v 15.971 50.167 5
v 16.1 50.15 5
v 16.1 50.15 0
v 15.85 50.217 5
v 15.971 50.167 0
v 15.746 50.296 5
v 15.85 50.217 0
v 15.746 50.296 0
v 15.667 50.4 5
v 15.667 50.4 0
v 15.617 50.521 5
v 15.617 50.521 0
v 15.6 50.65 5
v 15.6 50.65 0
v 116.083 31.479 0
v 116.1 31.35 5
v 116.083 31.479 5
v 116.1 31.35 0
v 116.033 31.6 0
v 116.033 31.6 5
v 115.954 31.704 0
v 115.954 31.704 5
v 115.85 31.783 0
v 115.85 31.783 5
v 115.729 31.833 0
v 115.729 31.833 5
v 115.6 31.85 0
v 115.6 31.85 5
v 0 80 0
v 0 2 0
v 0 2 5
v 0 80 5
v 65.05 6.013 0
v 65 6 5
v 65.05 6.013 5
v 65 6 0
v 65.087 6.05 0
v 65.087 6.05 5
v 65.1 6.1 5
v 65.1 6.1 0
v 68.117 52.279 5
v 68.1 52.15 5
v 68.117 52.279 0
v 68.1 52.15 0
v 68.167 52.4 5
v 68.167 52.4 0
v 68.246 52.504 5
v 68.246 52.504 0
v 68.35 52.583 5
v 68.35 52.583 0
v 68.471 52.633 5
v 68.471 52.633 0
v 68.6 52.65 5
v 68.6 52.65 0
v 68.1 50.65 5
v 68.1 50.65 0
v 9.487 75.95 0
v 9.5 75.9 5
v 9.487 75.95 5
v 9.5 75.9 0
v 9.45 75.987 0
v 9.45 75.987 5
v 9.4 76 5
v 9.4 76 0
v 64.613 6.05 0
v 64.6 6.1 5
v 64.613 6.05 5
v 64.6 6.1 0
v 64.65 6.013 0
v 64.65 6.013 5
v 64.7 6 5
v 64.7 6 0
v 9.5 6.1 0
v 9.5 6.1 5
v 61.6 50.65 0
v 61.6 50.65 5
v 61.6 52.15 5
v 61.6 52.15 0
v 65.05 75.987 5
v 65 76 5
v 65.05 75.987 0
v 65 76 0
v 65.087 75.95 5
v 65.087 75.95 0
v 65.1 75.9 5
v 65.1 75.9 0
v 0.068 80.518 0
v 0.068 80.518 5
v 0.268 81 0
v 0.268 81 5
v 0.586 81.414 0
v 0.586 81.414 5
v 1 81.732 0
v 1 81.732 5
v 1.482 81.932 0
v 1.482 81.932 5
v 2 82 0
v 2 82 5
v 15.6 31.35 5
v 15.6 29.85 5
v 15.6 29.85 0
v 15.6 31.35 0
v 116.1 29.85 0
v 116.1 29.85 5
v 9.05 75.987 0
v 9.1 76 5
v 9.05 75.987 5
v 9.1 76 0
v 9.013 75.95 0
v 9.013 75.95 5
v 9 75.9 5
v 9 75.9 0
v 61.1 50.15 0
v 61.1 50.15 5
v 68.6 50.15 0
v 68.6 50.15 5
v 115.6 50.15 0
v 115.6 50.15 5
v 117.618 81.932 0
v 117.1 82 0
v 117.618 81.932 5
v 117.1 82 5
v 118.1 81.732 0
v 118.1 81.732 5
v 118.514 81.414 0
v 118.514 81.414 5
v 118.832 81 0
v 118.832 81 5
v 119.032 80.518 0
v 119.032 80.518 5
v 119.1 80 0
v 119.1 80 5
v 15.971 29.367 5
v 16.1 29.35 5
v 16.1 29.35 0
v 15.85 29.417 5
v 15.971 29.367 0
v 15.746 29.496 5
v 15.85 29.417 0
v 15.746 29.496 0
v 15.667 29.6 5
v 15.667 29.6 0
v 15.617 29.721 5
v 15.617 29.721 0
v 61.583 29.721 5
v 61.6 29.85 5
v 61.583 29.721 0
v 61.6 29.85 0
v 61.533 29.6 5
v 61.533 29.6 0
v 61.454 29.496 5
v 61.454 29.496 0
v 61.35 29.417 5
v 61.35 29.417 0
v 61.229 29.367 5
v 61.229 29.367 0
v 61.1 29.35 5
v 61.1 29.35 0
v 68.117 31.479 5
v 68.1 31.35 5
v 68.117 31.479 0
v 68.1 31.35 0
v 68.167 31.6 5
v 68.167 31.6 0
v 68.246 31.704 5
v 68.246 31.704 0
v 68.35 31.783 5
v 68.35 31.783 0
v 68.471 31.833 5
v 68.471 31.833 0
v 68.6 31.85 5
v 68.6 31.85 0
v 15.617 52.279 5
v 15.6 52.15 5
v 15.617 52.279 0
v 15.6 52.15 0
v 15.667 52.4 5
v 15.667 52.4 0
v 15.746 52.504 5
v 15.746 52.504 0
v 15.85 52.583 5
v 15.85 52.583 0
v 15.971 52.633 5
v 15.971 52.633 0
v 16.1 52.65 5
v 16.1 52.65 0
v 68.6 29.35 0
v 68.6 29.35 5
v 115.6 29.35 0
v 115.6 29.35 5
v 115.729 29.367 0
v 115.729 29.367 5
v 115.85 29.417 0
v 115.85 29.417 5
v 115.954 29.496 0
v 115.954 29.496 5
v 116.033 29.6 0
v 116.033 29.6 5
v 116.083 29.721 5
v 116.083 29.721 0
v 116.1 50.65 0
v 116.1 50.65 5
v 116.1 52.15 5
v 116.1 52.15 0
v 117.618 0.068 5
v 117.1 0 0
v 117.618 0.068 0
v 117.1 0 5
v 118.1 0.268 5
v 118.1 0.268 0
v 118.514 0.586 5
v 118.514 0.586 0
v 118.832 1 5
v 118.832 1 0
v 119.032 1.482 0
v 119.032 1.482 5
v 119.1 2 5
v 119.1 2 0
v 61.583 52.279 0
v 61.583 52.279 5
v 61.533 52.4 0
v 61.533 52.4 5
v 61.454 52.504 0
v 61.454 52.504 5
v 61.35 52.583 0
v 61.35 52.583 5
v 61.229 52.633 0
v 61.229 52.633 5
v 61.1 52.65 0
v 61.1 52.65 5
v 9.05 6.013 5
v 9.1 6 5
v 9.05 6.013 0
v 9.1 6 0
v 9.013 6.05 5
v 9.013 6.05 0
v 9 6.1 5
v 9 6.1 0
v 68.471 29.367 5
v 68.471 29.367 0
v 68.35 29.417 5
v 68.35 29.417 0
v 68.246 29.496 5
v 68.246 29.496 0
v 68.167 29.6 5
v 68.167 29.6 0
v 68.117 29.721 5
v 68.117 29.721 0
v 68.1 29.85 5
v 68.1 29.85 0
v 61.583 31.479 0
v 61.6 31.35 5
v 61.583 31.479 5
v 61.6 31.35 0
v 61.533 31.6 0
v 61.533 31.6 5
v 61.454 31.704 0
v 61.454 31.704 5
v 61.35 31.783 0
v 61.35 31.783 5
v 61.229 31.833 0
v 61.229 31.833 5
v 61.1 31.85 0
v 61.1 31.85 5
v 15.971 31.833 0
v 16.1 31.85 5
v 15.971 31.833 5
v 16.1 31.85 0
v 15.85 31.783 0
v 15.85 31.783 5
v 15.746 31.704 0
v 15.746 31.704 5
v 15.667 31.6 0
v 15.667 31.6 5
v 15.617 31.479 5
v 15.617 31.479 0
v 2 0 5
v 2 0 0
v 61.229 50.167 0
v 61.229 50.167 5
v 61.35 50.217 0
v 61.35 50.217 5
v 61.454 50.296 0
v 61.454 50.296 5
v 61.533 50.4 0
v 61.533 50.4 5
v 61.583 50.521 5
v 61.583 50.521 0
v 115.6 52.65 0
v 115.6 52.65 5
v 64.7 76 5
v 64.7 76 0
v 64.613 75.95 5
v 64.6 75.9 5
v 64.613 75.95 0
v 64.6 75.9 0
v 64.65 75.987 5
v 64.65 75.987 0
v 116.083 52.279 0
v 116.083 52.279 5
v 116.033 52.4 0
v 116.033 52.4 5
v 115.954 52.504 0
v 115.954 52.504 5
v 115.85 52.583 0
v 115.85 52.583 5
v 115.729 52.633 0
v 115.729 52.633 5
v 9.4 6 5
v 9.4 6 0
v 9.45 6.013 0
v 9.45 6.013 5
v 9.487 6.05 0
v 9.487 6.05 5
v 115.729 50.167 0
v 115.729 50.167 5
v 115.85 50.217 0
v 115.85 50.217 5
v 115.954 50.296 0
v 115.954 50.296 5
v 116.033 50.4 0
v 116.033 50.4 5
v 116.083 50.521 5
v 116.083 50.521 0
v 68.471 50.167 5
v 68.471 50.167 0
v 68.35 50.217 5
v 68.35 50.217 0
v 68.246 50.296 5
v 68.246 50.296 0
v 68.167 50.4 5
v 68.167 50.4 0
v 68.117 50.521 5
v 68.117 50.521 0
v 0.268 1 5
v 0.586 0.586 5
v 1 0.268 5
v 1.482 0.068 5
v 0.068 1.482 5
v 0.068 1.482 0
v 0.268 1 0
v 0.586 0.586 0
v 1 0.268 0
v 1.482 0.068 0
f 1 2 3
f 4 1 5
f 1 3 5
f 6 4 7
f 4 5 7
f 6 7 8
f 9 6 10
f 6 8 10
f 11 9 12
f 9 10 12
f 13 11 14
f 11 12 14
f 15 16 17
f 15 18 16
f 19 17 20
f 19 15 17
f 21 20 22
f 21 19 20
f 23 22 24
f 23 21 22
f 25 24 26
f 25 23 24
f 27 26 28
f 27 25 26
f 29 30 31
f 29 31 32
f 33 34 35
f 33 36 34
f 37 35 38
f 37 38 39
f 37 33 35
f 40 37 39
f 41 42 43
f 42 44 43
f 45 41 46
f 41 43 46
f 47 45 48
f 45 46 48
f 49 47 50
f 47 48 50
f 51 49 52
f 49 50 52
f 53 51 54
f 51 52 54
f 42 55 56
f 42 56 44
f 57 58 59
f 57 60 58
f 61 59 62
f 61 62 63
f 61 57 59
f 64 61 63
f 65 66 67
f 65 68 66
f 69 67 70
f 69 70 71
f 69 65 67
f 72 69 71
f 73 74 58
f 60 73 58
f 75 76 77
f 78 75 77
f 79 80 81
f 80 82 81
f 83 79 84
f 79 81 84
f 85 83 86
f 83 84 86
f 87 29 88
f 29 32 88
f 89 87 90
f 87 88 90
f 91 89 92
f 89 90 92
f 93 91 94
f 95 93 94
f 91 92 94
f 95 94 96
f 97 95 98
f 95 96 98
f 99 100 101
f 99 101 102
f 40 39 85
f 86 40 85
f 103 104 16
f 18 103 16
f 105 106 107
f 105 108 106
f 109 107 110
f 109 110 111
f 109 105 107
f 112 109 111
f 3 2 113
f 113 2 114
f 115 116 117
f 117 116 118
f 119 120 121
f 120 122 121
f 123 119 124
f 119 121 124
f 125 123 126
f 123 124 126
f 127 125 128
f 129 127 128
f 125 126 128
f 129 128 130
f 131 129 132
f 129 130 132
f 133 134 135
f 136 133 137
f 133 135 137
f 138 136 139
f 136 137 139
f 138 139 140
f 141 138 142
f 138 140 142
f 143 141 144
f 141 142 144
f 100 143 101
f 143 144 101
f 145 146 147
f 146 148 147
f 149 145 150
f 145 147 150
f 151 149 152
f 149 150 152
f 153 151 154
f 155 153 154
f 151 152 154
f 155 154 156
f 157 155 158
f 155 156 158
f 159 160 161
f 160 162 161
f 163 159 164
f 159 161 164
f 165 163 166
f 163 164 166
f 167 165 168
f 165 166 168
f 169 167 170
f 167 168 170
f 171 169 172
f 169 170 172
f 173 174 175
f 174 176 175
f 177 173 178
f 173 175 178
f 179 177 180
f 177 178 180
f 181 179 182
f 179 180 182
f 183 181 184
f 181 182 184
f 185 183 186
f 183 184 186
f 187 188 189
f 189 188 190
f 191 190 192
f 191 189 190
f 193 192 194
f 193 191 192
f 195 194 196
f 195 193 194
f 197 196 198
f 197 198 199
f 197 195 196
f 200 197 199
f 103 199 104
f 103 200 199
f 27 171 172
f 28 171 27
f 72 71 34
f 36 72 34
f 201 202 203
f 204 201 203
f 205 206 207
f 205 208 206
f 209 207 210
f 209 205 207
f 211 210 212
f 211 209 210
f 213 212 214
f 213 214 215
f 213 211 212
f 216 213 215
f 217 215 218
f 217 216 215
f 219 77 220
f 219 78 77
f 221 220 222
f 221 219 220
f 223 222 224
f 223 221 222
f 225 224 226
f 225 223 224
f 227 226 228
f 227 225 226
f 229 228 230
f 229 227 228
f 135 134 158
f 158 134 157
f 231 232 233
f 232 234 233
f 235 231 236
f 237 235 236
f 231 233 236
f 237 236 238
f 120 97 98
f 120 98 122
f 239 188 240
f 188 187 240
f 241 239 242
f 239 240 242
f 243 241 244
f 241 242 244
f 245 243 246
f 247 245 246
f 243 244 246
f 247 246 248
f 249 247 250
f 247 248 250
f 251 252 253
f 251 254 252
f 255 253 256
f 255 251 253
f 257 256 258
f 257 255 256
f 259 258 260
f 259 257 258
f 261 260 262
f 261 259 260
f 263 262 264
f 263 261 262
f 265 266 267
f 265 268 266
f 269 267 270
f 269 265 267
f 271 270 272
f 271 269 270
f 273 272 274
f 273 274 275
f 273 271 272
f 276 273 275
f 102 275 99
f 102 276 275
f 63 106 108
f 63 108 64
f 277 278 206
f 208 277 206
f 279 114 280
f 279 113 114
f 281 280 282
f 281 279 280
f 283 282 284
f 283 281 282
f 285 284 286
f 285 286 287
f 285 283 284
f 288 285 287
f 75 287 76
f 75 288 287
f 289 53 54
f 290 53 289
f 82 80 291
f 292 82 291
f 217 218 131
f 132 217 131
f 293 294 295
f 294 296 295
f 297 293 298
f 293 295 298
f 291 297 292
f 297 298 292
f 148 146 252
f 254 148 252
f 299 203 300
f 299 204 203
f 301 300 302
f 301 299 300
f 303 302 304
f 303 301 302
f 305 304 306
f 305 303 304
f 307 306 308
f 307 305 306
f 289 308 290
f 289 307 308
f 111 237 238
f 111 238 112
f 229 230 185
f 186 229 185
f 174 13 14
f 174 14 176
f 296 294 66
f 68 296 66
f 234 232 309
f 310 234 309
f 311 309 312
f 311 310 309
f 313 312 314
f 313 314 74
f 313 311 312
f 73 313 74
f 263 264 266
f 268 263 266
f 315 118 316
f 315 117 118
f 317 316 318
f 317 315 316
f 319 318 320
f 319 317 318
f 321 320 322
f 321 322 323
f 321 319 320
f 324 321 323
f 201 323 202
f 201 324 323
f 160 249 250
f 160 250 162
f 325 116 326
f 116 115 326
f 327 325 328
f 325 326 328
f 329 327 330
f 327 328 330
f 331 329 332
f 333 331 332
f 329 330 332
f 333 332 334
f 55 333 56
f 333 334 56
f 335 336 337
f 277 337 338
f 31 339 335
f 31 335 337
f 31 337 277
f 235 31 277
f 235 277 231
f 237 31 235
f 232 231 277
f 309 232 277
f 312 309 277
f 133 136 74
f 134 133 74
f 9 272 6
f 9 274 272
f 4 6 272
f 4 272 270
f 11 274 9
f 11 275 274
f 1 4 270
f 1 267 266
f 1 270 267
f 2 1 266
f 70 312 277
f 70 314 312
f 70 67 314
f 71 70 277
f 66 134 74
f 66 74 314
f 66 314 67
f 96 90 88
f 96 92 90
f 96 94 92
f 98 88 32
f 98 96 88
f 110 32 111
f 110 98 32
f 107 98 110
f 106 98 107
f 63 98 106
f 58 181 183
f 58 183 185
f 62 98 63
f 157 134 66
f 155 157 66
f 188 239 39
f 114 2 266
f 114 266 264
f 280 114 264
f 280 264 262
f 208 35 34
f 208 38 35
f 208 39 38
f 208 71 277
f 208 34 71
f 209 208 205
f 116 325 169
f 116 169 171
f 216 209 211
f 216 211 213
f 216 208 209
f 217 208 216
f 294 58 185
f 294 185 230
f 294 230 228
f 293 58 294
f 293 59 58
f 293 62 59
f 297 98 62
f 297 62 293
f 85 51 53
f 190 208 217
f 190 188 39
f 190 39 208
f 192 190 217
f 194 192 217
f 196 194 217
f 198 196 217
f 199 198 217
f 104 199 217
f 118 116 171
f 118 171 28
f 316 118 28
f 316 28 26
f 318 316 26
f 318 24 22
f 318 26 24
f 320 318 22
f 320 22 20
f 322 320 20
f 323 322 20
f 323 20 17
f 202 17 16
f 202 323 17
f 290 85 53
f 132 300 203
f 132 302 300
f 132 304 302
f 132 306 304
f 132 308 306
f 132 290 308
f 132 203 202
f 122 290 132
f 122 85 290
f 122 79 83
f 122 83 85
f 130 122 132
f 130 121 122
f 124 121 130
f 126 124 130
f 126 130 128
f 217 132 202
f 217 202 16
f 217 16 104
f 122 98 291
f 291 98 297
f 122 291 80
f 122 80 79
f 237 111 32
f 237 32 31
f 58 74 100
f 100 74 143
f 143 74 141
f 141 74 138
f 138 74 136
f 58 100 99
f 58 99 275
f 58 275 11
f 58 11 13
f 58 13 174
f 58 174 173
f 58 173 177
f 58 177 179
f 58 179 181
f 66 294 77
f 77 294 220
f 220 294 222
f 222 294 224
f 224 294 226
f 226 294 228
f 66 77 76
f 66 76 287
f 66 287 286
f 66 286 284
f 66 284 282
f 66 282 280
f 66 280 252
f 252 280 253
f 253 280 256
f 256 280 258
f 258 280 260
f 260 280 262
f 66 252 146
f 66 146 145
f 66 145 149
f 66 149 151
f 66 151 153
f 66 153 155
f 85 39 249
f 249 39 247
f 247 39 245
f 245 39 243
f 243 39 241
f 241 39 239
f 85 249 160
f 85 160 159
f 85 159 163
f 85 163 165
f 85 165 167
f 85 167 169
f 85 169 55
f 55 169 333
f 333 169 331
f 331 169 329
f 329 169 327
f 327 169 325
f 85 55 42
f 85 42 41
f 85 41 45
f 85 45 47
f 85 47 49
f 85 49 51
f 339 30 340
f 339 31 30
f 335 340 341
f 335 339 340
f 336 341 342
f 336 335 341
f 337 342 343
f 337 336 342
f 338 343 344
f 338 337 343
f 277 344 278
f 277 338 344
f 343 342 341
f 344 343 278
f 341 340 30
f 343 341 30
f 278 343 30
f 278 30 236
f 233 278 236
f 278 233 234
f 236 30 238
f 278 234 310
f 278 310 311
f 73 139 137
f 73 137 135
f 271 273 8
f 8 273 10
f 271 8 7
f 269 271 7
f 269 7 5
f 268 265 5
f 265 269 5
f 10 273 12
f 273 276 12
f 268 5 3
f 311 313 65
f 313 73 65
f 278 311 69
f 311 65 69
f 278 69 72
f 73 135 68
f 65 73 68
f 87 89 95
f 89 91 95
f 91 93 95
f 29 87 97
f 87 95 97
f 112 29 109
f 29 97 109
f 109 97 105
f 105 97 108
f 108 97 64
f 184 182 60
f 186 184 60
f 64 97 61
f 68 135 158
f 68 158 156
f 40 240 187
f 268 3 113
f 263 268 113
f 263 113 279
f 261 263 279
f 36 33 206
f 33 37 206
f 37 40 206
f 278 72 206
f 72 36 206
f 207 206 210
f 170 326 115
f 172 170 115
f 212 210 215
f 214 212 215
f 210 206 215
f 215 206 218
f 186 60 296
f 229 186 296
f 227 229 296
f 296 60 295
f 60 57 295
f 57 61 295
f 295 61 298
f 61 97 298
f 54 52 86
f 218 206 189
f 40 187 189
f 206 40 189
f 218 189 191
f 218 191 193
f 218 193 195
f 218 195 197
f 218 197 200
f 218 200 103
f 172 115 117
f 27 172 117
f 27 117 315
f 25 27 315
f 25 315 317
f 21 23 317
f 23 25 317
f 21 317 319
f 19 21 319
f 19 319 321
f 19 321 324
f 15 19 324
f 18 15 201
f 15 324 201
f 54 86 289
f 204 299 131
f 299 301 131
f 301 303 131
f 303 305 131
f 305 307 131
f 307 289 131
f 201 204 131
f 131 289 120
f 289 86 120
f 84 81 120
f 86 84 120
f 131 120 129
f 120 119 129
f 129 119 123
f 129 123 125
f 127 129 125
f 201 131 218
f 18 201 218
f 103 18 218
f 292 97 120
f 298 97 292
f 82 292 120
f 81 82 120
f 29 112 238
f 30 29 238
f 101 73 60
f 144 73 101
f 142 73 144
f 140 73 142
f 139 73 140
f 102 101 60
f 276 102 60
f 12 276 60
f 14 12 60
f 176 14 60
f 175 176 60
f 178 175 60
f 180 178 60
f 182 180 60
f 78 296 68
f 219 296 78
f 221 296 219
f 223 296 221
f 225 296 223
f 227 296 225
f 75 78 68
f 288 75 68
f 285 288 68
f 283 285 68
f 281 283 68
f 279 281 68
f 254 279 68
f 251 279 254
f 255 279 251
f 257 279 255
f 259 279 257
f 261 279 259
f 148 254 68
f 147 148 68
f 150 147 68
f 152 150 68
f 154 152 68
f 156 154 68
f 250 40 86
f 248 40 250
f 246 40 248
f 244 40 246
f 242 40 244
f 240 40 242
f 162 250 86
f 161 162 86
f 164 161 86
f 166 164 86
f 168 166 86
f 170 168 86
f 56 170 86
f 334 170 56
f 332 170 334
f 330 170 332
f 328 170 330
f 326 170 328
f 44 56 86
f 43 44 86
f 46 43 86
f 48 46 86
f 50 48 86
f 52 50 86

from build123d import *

# Parameters (mm, degrees)
F0_W     = 119.1
F0_H     = 82
F1_DEPTH = 5
F3_DEPTH = 63.1
F4_W     = 6.8
F4_H     = 2.5
F4_W_2   = 7
F4_W_3   = 6.5
F5_DEPTH = 53.3
F6_W     = 48
F6_H     = 2.5
F7_DEPTH = 27.8
F8_W     = 0.5
F8_H     = 70
F9_DEPTH = 25
F10_R    = 2
F11_R    = 0.5
F12_R    = 0.1


with BuildPart() as f1:
    # F0 (on Top) → F1 (new body)
    with BuildSketch(Plane.XY):
        with Locations((59.55, 41)):
            Rectangle(F0_W, F0_H)
    extrude(amount=F1_DEPTH)

    # F2 (on face) → F3 (cut)
    with BuildSketch(Plane.XY.offset(5)):
        Polygon((64.6, 76), (64.6, 25), (64.6, 6), (65.1, 6), (65.1, 76), align=None)
    extrude(amount=-F3_DEPTH, mode=Mode.SUBTRACT)

    # F4 (on face) → F5 (cut)
    with BuildSketch(Plane.XY.offset(5)):
        with Locations((32.3, 51.4)):
            Rectangle(F4_W, F4_H)
        Polygon((35.7, 50.15), (38.9217214942, 50.15), (41.1, 50.15), (41.1, 52.65), (35.7, 52.65), align=None)
        with Locations((44.6, 51.4)):
            Rectangle(F4_W_2, F4_H)
        with Locations((51.35, 51.4)):
            Rectangle(F4_W_3, F4_H)
        with Locations((19, 51.4)):
            Rectangle(F4_W, F4_H)
        with Locations((25.65, 51.4)):
            Rectangle(F4_W_3, F4_H)
        with Locations((58.1, 51.4)):
            Rectangle(F4_W_2, F4_H)
        with Locations((44.6, 30.6)):
            Rectangle(F4_W_2, F4_H)
        with Locations((32.3, 30.6)):
            Rectangle(F4_W, F4_H)
        with Locations((58.1, 30.6)):
            Rectangle(F4_W_2, F4_H)
        Polygon((41.1, 31.85), (38.9217214942, 31.85), (35.7, 31.85), (35.7, 29.35), (38, 29.35), (41.1, 29.35), align=None)
        with Locations((51.35, 30.6)):
            Rectangle(F4_W_3, F4_H)
        with Locations((25.65, 30.6)):
            Rectangle(F4_W_3, F4_H)
        with Locations((19, 30.6)):
            Rectangle(F4_W, F4_H)
    extrude(amount=-F5_DEPTH, mode=Mode.SUBTRACT)

    # F6 (on face) → F7 (cut)
    with BuildSketch(Plane.XY.offset(5)):
        with Locations((92.1, 51.4)):
            Rectangle(F6_W, F6_H)
        with Locations((92.1, 30.6)):
            Rectangle(F6_W, F6_H)
    extrude(amount=-F7_DEPTH, mode=Mode.SUBTRACT)

    # F8 (on face) → F9 (cut)
    with BuildSketch(Plane.XY.offset(5)):
        with Locations((9.25, 41)):
            Rectangle(F8_W, F8_H)
    extrude(amount=-F9_DEPTH, mode=Mode.SUBTRACT)

    # F10
    f10_edges = [f1.edges().sort_by_distance(p)[0] for p in [
        (119.1, 0, 2.5),
        (0, 0, 2.5),
        (119.1, 82, 2.5),
        (0, 82, 2.5),
    ]]
    fillet(f10_edges, radius=F10_R)

    # F11
    f11_edges = [f1.edges().sort_by_distance(p)[0] for p in [
        (15.6, 52.65, 2.5),
        (15.6, 50.15, 2.5),
        (61.6, 52.65, 2.5),
        (61.6, 50.15, 2.5),
        (68.1, 52.65, 2.5),
        (68.1, 50.15, 2.5),
        (116.1, 52.65, 2.5),
        (116.1, 50.15, 2.5),
        (116.1, 29.35, 2.5),
        (116.1, 31.85, 2.5),
        (68.1, 31.85, 2.5),
        (68.1, 29.35, 2.5),
        (15.6, 29.35, 2.5),
        (15.6, 31.85, 2.5),
        (61.6, 29.35, 2.5),
        (61.6, 31.85, 2.5),
    ]]
    fillet(f11_edges, radius=F11_R)

    # F12
    f12_edges = [f1.edges().sort_by_distance(p)[0] for p in [
        (64.6, 6, 2.5),
        (65.1, 6, 2.5),
        (64.6, 76, 2.5),
        (65.1, 76, 2.5),
        (9.5, 76, 2.5),
        (9, 76, 2.5),
        (9, 6, 2.5),
        (9.5, 6, 2.5),
    ]]
    fillet(f12_edges, radius=F12_R)


solid = f1.part
